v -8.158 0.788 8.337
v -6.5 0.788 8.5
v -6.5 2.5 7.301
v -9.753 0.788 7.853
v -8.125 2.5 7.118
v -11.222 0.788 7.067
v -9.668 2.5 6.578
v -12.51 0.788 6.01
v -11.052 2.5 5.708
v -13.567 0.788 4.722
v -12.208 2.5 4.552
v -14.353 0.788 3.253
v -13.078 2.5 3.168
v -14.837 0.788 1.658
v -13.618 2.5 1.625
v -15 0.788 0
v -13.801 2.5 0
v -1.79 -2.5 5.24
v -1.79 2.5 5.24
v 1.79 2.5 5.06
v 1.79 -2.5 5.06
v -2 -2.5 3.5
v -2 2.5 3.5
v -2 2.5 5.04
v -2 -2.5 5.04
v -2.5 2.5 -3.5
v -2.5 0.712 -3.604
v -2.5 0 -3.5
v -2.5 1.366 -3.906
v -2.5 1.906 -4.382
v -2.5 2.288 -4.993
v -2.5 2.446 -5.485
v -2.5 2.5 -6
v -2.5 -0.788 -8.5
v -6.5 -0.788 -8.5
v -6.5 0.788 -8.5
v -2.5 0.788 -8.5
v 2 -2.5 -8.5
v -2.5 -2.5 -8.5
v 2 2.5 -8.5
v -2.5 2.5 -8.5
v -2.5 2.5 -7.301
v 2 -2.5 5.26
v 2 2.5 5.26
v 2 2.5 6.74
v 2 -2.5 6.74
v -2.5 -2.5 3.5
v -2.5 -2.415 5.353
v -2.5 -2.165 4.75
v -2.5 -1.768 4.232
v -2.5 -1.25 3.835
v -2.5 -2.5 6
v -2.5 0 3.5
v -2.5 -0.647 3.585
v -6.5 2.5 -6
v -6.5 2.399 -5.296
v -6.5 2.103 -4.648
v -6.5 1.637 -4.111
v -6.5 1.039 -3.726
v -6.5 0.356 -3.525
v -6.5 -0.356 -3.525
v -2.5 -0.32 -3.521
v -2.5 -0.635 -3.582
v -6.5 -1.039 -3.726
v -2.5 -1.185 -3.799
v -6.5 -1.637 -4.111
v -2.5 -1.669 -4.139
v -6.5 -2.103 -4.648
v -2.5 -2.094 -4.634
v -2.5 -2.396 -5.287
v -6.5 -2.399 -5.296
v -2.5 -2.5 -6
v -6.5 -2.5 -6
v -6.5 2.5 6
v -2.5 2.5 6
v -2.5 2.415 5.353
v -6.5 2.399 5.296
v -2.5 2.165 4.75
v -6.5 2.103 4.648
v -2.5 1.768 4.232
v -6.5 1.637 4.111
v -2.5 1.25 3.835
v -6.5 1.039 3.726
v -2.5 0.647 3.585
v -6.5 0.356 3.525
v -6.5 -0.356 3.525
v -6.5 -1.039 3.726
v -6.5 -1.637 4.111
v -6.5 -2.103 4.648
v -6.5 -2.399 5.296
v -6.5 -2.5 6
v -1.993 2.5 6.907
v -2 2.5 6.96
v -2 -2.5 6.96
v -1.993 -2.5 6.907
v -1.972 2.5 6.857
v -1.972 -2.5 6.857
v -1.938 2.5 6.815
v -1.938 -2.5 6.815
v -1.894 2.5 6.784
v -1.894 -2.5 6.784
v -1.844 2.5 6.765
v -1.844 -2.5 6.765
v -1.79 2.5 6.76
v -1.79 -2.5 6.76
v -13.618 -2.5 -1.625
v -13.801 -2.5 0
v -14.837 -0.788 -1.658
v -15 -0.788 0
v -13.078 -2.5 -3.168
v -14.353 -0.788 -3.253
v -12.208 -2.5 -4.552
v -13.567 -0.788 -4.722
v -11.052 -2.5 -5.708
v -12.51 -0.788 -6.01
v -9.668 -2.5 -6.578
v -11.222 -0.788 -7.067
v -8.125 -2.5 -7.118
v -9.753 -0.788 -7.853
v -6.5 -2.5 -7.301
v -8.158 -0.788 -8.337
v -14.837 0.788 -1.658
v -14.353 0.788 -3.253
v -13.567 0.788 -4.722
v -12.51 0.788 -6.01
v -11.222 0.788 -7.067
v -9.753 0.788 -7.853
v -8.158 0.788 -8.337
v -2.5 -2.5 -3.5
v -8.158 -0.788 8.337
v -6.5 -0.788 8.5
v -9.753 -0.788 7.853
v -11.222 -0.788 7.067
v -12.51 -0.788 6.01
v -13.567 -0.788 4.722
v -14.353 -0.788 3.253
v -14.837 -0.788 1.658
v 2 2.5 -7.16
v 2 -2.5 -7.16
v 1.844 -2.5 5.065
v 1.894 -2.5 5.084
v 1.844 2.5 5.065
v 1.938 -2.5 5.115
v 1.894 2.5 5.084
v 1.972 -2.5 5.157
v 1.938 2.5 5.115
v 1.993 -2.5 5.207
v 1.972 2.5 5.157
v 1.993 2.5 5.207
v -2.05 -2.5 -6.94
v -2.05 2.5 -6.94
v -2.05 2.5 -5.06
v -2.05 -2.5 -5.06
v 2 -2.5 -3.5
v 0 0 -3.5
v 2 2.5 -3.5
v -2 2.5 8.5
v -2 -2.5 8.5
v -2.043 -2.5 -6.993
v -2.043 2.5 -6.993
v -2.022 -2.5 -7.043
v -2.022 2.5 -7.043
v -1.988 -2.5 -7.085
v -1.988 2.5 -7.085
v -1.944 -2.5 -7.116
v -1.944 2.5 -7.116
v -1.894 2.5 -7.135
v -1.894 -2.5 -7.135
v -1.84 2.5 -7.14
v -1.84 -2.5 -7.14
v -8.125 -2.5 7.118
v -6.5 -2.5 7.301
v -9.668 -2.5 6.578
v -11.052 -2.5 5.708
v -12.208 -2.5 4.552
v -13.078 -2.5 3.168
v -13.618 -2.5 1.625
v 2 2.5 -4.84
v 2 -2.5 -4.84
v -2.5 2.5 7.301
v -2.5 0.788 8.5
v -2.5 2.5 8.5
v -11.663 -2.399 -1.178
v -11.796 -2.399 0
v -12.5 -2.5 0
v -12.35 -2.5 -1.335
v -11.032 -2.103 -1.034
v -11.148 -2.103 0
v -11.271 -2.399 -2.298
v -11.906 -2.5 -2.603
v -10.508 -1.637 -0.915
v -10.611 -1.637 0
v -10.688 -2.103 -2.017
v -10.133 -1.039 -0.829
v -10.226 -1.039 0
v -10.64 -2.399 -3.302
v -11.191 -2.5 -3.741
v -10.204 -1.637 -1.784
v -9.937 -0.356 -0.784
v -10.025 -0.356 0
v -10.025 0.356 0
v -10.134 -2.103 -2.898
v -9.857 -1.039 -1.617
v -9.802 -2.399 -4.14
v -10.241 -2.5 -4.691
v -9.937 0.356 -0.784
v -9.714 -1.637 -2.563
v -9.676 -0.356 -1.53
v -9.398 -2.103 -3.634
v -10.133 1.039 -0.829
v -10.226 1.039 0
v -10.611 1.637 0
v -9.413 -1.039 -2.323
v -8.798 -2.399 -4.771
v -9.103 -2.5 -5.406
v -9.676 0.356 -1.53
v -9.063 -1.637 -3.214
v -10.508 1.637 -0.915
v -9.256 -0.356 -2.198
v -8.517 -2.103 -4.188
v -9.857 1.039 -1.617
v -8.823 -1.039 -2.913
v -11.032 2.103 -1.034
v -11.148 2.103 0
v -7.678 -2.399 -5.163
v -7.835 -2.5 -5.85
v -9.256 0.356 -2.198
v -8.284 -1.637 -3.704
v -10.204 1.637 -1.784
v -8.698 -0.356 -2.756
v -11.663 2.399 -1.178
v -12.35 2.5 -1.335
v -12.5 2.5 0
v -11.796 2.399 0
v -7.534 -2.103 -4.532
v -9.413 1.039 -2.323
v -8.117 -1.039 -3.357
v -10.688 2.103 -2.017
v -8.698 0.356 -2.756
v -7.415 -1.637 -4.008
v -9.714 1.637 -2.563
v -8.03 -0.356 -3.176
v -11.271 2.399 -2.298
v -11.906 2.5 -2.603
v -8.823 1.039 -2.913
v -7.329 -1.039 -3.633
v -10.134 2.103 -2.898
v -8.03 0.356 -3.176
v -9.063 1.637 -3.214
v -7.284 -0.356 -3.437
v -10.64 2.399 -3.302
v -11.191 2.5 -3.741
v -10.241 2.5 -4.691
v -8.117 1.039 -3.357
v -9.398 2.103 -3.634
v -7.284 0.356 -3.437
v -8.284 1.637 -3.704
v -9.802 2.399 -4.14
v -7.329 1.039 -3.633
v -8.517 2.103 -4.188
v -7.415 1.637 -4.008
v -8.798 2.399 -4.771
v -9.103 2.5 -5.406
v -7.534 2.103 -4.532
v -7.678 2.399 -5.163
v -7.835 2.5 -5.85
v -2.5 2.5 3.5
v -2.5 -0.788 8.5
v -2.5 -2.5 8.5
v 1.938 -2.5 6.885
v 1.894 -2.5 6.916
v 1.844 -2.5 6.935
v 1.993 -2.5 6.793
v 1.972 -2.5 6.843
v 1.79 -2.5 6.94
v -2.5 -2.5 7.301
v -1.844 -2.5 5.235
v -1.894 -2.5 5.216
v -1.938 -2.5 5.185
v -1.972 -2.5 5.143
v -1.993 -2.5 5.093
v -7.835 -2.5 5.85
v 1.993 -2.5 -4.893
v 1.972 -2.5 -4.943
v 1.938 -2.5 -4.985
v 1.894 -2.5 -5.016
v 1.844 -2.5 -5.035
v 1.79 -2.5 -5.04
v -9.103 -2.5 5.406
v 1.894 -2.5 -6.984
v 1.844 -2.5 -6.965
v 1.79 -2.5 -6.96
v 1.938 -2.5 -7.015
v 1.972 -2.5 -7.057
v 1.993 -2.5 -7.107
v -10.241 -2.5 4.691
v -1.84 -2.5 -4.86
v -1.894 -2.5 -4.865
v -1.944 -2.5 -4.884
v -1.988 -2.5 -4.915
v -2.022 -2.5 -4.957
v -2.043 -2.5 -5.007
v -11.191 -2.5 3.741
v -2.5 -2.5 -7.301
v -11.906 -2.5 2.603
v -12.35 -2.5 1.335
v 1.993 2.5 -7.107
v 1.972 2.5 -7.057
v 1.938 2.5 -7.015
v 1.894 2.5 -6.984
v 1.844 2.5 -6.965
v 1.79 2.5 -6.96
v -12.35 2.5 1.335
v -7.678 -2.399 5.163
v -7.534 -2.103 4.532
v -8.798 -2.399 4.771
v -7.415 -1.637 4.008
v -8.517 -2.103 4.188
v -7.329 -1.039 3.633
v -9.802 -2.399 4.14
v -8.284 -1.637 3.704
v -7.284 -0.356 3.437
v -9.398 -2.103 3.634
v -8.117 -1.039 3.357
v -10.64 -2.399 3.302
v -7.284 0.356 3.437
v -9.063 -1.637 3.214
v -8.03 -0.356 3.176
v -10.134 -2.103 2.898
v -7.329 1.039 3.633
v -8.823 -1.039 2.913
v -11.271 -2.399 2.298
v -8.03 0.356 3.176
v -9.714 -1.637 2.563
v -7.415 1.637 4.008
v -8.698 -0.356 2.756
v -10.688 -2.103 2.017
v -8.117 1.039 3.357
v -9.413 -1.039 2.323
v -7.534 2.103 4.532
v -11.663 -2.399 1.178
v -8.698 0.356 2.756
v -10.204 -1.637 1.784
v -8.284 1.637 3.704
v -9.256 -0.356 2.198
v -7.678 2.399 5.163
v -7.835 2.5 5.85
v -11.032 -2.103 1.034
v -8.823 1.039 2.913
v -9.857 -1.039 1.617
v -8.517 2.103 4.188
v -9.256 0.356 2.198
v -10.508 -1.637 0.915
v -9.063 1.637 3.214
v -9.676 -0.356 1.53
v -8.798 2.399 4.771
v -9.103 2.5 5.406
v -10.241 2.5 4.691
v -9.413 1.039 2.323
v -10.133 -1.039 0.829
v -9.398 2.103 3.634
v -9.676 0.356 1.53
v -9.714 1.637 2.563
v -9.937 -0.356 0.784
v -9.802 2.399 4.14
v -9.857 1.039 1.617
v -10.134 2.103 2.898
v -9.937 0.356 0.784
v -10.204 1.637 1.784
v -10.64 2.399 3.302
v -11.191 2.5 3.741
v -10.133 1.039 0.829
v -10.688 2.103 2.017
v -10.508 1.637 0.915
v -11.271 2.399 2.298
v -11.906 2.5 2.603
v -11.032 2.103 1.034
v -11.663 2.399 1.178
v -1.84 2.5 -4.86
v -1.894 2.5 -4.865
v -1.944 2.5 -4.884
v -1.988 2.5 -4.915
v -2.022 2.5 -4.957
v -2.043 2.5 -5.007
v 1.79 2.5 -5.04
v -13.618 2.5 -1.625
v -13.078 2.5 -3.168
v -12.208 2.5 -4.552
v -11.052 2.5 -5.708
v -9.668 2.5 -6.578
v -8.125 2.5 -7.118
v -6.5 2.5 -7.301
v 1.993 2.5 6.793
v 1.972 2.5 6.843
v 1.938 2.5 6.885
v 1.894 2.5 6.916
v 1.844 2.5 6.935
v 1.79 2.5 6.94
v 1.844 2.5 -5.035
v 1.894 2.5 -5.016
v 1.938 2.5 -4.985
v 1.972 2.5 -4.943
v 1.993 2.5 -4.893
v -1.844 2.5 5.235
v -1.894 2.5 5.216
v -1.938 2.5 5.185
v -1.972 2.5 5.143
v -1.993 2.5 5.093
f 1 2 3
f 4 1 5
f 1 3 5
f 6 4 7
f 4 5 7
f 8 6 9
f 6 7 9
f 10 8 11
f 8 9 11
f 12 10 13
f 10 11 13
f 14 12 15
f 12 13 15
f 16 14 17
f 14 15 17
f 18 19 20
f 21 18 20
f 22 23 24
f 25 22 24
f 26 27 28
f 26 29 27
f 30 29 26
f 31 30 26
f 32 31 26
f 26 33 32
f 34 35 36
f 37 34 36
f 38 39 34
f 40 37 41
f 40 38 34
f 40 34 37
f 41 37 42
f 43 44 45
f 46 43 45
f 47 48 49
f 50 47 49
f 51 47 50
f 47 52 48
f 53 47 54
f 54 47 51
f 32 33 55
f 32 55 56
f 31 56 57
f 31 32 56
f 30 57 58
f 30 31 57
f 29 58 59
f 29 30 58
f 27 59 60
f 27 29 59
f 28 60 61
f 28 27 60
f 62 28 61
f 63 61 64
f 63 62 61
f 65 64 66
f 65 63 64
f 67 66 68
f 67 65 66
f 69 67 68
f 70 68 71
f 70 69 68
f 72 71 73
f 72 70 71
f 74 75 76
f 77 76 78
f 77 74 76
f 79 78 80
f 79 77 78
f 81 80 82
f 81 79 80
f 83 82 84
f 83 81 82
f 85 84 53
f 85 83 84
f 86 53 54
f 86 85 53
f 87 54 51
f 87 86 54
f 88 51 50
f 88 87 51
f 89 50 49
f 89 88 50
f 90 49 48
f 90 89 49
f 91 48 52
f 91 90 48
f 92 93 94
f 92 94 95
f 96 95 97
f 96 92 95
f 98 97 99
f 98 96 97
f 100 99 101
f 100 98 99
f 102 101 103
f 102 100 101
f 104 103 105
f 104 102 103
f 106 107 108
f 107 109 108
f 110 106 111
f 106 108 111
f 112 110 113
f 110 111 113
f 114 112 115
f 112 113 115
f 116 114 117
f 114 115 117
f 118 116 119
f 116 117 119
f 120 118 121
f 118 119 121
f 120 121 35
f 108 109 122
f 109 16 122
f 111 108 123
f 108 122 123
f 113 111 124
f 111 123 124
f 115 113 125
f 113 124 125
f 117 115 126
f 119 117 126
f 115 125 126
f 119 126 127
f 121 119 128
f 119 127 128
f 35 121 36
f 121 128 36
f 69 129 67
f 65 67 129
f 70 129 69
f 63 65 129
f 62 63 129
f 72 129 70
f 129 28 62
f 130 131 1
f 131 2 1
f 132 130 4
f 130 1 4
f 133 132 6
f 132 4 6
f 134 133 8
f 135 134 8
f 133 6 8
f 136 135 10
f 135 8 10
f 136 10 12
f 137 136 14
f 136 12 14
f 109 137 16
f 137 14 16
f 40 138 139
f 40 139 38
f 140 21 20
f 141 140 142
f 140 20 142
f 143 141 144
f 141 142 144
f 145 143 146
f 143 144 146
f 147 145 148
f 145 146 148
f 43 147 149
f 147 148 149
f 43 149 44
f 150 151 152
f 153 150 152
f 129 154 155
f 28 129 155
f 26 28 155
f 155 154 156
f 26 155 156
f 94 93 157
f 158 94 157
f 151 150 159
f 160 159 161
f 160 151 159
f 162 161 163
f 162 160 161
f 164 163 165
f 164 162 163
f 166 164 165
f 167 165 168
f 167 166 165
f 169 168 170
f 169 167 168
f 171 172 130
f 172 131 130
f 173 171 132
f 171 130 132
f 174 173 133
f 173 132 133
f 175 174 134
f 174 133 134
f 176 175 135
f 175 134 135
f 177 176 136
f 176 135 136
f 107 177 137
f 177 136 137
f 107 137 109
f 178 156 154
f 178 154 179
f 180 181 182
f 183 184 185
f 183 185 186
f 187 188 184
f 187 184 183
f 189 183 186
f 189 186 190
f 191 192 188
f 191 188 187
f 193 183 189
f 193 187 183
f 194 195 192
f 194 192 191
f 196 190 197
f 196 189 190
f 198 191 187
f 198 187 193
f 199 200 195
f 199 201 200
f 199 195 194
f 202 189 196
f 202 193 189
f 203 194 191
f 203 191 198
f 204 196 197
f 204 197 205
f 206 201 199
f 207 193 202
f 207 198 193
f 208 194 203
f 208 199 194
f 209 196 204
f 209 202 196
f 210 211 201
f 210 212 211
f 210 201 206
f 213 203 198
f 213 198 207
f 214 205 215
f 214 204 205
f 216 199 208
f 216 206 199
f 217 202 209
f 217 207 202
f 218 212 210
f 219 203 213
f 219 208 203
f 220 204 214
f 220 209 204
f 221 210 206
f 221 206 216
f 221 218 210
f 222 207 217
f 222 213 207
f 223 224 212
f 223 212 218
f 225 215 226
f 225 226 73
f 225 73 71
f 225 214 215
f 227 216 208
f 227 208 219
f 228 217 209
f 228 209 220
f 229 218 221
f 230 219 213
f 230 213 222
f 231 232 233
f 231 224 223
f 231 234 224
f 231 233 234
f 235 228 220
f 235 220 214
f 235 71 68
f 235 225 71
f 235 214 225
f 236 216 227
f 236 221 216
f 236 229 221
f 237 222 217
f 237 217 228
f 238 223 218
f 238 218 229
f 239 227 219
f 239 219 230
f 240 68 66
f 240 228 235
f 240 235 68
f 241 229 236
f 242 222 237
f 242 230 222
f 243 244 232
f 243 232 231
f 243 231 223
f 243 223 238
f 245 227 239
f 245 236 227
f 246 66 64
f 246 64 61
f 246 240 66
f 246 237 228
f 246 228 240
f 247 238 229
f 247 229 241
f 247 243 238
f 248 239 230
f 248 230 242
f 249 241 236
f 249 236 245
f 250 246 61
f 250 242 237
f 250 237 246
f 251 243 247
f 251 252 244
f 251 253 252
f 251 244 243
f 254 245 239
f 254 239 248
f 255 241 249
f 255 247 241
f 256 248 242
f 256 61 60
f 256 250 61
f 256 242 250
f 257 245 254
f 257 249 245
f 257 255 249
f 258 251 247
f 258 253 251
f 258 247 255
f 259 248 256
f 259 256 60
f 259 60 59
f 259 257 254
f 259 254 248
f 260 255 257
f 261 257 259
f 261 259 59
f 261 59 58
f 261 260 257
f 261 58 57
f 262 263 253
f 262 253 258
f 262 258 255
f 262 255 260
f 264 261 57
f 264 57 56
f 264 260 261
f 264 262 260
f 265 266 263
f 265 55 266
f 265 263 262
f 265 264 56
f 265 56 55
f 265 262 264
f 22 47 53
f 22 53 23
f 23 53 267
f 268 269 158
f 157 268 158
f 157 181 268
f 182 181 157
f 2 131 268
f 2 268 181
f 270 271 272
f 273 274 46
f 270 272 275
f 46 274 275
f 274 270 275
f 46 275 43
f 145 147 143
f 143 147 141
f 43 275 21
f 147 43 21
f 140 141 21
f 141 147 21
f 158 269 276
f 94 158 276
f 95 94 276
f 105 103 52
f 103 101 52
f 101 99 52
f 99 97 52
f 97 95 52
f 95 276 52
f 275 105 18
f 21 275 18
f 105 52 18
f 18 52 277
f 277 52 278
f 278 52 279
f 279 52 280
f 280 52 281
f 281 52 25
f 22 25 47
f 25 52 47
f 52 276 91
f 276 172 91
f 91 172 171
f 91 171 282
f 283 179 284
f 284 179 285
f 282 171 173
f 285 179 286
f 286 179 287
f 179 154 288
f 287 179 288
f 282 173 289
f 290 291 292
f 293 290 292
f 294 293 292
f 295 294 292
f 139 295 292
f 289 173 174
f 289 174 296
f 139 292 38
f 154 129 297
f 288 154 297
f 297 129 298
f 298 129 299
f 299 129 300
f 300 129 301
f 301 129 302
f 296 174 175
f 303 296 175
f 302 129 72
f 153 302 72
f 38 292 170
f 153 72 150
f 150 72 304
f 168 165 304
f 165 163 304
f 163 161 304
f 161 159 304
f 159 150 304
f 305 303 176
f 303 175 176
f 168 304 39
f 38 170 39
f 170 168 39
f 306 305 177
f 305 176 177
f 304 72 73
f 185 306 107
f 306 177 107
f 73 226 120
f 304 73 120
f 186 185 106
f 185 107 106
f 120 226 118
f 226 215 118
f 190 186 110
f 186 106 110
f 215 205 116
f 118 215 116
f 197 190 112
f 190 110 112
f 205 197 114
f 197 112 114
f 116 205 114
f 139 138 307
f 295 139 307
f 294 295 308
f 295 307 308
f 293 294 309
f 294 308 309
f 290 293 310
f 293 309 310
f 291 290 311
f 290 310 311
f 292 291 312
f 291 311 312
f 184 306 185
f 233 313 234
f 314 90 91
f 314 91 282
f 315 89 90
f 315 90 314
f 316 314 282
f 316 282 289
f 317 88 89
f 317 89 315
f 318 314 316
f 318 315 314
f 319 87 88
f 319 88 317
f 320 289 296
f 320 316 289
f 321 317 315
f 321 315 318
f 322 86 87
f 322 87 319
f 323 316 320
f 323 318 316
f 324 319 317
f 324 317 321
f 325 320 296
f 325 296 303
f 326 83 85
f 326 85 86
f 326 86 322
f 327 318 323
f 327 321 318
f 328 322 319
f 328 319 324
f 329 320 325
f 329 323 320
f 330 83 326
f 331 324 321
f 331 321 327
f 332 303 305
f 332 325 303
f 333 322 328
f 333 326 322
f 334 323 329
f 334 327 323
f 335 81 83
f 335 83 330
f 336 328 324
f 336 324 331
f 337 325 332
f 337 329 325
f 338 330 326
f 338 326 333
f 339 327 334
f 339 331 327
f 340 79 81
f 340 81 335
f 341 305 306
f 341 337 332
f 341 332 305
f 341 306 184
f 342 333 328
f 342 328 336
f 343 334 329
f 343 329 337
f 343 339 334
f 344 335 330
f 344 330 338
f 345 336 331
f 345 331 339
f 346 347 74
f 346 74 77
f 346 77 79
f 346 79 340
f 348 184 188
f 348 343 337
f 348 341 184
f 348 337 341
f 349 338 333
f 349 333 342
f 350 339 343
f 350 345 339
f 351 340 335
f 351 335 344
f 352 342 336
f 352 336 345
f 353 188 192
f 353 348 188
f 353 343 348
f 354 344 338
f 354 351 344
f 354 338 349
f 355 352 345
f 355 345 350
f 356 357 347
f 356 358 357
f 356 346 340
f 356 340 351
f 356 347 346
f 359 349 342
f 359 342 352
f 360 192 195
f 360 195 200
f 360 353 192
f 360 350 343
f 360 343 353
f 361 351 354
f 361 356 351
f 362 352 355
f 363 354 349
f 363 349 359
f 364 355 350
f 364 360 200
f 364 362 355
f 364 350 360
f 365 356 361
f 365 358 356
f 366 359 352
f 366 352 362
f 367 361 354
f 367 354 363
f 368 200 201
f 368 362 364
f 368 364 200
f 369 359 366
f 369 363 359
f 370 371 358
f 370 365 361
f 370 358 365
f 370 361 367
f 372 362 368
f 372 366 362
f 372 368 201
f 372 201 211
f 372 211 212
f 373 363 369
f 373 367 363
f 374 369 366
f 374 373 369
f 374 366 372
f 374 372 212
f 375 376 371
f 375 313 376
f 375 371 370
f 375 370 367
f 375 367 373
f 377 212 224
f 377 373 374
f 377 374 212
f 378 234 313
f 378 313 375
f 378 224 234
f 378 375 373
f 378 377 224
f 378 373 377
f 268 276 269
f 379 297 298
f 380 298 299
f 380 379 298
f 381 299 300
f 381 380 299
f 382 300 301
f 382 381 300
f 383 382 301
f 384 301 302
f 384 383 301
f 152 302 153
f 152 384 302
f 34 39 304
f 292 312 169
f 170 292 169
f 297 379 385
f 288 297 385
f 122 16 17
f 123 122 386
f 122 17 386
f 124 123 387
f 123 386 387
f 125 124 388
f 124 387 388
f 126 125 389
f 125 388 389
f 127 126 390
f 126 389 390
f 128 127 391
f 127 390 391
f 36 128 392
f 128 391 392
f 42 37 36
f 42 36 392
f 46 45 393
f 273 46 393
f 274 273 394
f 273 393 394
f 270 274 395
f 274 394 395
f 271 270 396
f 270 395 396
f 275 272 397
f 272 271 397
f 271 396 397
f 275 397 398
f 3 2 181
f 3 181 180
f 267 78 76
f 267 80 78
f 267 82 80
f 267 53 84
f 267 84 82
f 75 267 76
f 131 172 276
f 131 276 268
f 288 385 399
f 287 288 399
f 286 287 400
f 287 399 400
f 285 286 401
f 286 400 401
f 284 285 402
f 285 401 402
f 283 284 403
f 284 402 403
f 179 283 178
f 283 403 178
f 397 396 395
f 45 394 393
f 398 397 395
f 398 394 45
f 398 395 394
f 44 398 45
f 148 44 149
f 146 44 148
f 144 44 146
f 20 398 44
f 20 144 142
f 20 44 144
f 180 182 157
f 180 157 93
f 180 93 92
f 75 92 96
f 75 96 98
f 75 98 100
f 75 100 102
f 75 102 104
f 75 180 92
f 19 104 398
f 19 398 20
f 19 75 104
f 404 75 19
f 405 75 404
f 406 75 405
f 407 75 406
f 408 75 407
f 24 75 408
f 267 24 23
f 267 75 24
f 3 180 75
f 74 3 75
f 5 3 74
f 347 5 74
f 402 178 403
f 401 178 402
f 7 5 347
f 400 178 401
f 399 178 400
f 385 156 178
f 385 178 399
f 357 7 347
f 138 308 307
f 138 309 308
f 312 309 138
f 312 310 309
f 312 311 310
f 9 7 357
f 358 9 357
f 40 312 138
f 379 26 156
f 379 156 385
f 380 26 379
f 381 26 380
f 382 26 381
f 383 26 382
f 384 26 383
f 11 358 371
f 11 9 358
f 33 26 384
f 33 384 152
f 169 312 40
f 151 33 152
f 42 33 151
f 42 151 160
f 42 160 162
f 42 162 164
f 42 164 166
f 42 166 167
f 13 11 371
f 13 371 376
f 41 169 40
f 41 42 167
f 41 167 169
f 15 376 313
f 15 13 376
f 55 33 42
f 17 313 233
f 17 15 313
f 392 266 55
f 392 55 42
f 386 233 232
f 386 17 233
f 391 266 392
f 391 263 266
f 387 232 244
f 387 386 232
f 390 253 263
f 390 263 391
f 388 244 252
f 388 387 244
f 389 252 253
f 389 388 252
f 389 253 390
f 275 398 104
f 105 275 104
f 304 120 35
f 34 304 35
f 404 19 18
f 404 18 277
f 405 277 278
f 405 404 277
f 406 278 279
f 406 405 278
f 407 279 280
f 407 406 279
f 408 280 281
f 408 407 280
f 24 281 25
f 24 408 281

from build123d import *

# Parameters (mm, degrees)
SKETCH005_W             = 5
SKETCH005_H             = 5
PAD_DEPTH               = 2.5
POCKET_DEPTH            = 2.501
POCKET_DEPTH_BACK       = 2.501
BODY002_PLACEMENT_ANGLE = 180


with BuildPart() as part:
    # AdditivePipe001: sweep along a path in Sketch002
    with BuildLine(Plane.XZ) as additivepipe001_path:
        Line((0, -6), (6.500025, -6))
        ThreePointArc((6.500025, -6), (10.742649, -4.242632), (12.5, 0))
        ThreePointArc((12.5, 0), (10.742641, 4.242641), (6.5, 6))
        Line((6.5, 6), (-2.5e-05, 6))
    # Sketch003 → AdditivePipe001 (sweep)
    with BuildSketch(Plane.YZ):
        with BuildLine():
            ThreePointArc((2.5, -6), (0, -3.5), (-2.5, -6))
            Line((-2.5, -6), (-2.5, -7.301418))
            Line((-2.5, -7.301418), (-0.788247, -8.5))
            Line((-0.788247, -8.5), (0.788247, -8.5))
            Line((0.788247, -8.5), (2.5, -7.301418))
            Line((2.5, -7.301418), (2.5, -6))
        make_face()
    sweep(path=additivepipe001_path.line)

    # Sketch005 → Pad (new body, symmetric)
    with BuildSketch(Plane.YZ):
        with Locations((0, 6)):
            Rectangle(SKETCH005_W, SKETCH005_H)
        with Locations((0, -6)):
            Rectangle(SKETCH005_W, SKETCH005_H)
    extrude(amount=PAD_DEPTH, both=True)

    # Sketch004 → Pocket (cut, two sides)
    with BuildSketch(Plane.XZ) as pocket_sk:
        with BuildLine():
            Line((-1.790135, 6.960364), (1.840135, 7.139636))
            ThreePointArc((2.05, 6.93988), (1.98789, 7.084747), (1.840135, 7.139636))
            Line((2.05, 6.93988), (2.05, 5.06012))
            ThreePointArc((1.840135, 4.860364), (1.98789, 4.915253), (2.05, 5.06012))
            Line((1.840135, 4.860364), (-1.790135, 5.039636))
            ThreePointArc((-1.790135, 5.039636), (-1.93789, 4.984747), (-2, 4.83988))
            Line((-2, 3), (-2, 4.83988))
            Line((-2.5, 3), (-2, 3))
            Line((-2.5, 9), (-2.5, 3))
            Line((-2, 9), (-2.5, 9))
            Line((-2, 7.16012), (-2, 9))
            ThreePointArc((-2, 7.16012), (-1.93789, 7.015253), (-1.790135, 6.960364))
        make_face()
        with BuildLine():
            Line((1.790012, -5.239501), (-1.790013, -5.060499))
            ThreePointArc((-1.790013, -5.060499), (-1.937845, -5.11534), (-2, -5.26025))
            Line((-2, -5.26025), (-2, -6.73975))
            ThreePointArc((-2, -6.73975), (-1.937845, -6.88466), (-1.790012, -6.939501))
            Line((-1.790012, -6.939501), (1.790012, -6.760499))
            ThreePointArc((2, -6.96025), (1.937845, -6.81534), (1.790012, -6.760499))
            Line((2, -6.96025), (2, -9))
            Line((2, -9), (-3, -9))
            Line((-3, -9), (-3, -3))
            Line((-3, -3), (2, -3))
            Line((2, -3), (2, -5.03975))
            ThreePointArc((1.790012, -5.239501), (1.937845, -5.18466), (2, -5.03975))
        make_face()
    extrude(amount=-POCKET_DEPTH, mode=Mode.SUBTRACT)
    extrude(pocket_sk.sketch, amount=POCKET_DEPTH_BACK, mode=Mode.SUBTRACT)


with BuildPart() as part_1:
    # Body002 placement: moved
    add(part.part.rotate(Axis((0, 0, 0), (0, 1, 0)), BODY002_PLACEMENT_ANGLE))


solid = part_1.part
